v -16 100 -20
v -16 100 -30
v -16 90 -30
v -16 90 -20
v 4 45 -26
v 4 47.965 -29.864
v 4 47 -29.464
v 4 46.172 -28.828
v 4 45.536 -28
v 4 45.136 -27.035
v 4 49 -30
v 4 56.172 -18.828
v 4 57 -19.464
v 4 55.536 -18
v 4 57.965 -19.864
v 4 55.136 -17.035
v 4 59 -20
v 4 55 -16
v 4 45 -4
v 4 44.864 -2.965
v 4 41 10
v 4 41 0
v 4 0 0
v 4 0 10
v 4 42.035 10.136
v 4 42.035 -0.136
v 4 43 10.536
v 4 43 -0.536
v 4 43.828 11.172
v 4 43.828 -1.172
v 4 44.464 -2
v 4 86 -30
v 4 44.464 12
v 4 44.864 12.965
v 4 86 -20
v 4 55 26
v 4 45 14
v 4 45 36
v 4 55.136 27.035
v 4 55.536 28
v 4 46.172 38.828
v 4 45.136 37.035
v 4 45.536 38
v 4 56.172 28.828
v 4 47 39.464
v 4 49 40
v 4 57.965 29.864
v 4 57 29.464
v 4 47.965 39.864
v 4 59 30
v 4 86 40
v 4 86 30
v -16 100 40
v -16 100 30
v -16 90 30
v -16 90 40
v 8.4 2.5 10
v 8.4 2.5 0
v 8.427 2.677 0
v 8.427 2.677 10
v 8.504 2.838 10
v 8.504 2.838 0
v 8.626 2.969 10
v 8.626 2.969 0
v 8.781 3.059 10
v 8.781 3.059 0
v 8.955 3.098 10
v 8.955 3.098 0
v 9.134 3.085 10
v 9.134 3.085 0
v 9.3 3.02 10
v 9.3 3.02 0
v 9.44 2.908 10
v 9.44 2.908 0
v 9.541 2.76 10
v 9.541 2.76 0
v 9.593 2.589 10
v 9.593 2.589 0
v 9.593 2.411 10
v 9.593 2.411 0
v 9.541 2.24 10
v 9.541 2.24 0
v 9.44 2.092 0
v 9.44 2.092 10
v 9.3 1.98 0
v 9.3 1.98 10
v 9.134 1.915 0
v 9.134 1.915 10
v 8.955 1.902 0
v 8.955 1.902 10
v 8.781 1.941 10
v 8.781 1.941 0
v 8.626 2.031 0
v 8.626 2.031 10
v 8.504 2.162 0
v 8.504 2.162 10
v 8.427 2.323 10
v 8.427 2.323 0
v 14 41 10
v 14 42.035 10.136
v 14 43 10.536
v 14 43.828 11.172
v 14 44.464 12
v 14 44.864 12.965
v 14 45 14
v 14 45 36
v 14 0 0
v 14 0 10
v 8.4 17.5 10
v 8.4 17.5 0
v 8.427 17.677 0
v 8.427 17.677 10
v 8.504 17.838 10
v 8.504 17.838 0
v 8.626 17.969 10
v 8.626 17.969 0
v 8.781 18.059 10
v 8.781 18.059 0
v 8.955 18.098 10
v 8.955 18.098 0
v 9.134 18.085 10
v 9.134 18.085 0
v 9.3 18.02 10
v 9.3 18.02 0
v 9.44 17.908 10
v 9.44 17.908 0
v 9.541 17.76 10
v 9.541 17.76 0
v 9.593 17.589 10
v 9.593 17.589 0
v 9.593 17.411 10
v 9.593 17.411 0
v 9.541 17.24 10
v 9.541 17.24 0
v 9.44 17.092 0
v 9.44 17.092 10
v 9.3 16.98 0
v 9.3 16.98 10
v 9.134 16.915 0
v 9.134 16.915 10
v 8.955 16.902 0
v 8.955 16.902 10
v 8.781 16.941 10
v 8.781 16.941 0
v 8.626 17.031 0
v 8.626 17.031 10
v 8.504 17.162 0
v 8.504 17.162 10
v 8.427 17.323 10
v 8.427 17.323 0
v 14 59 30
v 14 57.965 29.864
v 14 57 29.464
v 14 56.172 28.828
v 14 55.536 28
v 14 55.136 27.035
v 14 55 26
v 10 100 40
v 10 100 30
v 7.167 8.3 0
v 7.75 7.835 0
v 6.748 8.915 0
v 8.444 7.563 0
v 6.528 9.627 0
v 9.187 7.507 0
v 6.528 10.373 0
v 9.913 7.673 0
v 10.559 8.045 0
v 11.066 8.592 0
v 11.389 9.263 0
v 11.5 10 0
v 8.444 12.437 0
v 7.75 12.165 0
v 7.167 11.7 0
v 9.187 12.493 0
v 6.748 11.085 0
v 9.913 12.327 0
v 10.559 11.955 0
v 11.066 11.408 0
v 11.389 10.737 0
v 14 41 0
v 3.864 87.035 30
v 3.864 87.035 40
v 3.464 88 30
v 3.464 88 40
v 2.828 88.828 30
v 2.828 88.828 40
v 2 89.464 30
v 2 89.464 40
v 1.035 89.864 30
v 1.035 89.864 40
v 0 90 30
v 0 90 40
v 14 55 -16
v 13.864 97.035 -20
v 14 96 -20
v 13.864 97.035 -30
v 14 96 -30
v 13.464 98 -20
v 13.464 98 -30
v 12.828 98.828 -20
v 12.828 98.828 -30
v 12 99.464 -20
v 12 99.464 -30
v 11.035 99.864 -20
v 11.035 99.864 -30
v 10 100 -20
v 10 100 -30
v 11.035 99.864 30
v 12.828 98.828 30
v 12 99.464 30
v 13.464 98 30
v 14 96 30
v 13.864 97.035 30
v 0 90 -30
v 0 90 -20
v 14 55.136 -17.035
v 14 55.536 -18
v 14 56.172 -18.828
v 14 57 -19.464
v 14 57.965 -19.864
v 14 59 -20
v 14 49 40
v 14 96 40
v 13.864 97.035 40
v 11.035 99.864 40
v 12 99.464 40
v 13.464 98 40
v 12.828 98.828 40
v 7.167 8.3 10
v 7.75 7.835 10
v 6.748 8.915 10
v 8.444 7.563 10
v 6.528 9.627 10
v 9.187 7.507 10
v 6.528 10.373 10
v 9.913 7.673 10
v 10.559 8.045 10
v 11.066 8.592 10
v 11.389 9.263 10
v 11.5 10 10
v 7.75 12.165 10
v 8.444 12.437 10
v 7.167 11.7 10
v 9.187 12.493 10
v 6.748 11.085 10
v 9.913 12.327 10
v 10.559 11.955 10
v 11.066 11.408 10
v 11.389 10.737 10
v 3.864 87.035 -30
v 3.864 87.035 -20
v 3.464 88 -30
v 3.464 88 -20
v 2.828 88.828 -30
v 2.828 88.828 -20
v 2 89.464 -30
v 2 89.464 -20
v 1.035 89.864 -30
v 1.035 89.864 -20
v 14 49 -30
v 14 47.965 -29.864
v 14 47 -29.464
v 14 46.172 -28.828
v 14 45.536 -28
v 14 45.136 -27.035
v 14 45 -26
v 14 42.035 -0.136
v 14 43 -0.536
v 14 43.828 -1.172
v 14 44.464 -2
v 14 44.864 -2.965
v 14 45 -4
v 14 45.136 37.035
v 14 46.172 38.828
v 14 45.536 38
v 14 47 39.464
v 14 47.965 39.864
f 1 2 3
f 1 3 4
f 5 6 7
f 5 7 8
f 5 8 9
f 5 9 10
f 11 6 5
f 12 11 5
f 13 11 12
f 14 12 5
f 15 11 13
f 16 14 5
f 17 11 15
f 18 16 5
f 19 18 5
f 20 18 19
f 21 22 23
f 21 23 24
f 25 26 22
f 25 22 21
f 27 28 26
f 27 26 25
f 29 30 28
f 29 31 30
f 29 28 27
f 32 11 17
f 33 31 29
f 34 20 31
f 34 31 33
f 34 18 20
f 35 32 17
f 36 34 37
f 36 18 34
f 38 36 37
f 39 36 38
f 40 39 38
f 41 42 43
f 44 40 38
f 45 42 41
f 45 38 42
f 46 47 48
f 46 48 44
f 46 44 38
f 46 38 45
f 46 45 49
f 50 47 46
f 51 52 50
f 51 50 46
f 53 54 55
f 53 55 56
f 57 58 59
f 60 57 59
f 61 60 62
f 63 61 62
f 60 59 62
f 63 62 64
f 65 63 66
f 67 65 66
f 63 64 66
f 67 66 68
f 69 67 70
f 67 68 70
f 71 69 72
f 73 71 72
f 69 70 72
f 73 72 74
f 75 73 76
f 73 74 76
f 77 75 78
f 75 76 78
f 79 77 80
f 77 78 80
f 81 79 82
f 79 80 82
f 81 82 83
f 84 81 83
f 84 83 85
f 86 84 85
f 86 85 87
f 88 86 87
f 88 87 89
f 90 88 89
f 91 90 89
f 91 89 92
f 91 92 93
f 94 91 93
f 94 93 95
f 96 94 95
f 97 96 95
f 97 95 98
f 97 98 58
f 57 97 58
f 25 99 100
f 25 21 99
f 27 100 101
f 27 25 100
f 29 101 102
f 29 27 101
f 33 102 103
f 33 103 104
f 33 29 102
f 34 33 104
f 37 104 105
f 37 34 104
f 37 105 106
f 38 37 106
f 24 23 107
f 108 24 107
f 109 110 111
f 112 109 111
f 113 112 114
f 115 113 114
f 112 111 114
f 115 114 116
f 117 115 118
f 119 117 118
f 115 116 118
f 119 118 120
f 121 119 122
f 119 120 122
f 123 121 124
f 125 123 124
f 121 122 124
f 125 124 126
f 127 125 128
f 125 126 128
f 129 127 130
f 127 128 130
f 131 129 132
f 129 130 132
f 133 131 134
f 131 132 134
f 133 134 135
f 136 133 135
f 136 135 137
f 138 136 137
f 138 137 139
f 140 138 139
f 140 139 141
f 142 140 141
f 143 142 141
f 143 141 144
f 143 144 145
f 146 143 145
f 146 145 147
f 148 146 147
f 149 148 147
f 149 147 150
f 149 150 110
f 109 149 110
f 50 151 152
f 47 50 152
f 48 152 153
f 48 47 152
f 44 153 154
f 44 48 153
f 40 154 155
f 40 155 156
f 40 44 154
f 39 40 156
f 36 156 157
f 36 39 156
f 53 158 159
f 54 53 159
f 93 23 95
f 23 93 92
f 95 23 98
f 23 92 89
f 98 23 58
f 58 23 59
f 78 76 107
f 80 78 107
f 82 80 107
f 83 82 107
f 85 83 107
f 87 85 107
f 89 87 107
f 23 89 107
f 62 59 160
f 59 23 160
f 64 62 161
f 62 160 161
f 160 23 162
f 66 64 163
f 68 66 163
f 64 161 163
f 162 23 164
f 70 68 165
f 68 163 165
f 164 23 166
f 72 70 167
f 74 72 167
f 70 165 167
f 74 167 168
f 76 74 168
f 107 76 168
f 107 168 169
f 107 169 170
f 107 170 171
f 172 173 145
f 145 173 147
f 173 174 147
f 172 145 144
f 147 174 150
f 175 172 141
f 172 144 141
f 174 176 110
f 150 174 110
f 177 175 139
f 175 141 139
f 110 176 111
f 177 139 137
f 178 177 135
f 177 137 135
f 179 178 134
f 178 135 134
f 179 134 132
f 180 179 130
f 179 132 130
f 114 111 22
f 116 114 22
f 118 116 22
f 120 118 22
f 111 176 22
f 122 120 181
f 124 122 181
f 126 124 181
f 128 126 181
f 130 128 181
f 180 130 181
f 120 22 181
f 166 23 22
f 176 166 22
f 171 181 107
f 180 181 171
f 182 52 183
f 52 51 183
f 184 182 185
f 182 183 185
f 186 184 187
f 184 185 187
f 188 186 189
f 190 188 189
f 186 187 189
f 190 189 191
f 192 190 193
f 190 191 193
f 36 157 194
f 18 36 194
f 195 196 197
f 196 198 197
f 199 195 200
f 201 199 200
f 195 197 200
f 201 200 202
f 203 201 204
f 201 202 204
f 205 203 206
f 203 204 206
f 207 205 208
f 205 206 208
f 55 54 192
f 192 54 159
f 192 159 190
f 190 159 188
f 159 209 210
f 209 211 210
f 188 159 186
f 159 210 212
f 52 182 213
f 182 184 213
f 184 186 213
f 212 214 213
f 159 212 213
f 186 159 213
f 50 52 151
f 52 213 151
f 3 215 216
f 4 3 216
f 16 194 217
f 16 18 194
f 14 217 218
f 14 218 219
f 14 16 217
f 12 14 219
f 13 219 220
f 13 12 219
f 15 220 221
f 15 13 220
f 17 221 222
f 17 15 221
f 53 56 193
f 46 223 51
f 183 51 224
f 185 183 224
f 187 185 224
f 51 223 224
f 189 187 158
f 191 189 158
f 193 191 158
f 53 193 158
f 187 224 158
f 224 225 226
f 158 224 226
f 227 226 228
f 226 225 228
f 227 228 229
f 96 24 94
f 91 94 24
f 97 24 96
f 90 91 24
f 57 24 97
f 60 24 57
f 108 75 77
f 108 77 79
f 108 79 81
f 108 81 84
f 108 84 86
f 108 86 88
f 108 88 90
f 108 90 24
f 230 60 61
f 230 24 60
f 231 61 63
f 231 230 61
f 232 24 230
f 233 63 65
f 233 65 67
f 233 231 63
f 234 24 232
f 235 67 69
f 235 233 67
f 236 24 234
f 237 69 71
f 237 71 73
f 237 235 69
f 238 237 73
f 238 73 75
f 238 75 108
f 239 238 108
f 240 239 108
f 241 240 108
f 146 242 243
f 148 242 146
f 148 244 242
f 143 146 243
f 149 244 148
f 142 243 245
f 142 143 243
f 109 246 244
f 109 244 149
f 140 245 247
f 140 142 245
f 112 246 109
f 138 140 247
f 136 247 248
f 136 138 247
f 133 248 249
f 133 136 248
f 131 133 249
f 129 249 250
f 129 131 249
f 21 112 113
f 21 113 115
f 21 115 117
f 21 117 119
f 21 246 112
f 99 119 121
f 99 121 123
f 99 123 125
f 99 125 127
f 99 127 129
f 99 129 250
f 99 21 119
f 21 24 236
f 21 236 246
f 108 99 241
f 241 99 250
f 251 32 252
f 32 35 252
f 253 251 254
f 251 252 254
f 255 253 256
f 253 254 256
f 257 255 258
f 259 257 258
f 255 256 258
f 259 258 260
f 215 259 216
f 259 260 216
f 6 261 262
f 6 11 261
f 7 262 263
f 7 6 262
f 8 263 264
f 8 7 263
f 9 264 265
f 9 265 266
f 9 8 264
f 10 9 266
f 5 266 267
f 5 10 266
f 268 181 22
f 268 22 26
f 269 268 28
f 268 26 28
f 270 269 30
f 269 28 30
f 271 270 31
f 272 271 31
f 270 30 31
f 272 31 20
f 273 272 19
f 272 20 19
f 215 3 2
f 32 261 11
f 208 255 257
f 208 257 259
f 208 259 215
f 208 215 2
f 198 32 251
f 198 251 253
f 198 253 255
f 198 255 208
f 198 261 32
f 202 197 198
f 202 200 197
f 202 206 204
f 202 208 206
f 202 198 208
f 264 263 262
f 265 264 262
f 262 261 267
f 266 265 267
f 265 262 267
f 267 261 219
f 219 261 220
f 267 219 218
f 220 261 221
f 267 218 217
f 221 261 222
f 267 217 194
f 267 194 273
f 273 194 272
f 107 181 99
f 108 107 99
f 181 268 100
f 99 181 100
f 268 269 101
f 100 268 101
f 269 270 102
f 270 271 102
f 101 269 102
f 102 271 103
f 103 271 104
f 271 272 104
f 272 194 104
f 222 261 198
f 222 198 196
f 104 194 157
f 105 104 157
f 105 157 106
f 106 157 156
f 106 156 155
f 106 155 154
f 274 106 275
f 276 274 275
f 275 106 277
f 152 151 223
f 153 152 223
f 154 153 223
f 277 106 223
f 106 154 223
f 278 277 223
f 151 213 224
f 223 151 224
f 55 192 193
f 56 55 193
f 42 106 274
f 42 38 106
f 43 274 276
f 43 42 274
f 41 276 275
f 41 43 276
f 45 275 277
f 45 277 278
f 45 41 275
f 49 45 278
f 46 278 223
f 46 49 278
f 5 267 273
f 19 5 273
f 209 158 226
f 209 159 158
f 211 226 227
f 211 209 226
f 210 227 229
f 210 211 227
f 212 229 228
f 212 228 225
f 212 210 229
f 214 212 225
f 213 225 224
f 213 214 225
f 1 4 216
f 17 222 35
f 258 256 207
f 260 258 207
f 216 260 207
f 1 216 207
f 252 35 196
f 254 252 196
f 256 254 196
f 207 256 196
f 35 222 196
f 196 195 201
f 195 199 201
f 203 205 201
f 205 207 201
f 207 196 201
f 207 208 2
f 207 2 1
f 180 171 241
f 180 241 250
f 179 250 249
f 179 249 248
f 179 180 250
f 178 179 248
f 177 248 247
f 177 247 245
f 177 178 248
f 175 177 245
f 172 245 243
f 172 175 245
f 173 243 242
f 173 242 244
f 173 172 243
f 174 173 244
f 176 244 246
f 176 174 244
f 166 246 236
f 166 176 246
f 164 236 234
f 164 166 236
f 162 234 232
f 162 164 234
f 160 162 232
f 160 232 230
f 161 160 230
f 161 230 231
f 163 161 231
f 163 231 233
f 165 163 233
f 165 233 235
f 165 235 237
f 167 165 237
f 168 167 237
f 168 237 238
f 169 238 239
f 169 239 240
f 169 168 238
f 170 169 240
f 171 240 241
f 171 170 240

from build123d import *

# Parameters (mm, degrees)
ESQUISSE1_W        = 10
ESQUISSE1_H        = 55
ESQUISSE1_R        = 2.5
ESQUISSE1_R_2      = 0.5
BOSS_EXTRU_1_DEPTH = 10
BOSS_EXTRU_2_DEPTH = 10
ESQUISSE5_W        = 10
ESQUISSE5_H        = 10
BOSS_EXTRU_3_DEPTH = 20
CONG_1_R           = 4
D_GAGEMENT_M11_D   = 1.2


with BuildPart() as part:
    # Esquisse1 → Boss.-Extru.1 (new body)
    with BuildSketch(Plane.XY):
        with Locations((9, 27.5)):
            Rectangle(ESQUISSE1_W, ESQUISSE1_H)
        with Locations((9, 10)):
            Circle(ESQUISSE1_R, mode=Mode.SUBTRACT)
        with Locations((9, 17.5)):
            Circle(ESQUISSE1_R_2, mode=Mode.SUBTRACT)
        with Locations((9, 2.5)):
            Circle(ESQUISSE1_R_2, mode=Mode.SUBTRACT)
    extrude(amount=BOSS_EXTRU_1_DEPTH)

    # Esquisse4 → Boss.-Extru.2 (add)
    with BuildSketch(Plane(origin=(14, 0, 0), x_dir=(0, 0, -1), z_dir=(1, 0, 0))):
        Polygon((-30, 55), (20, 55), (20, 100), (30, 100), (30, 45), (-40, 45), (-40, 100), (-30, 100), align=None)
    extrude(amount=-BOSS_EXTRU_2_DEPTH)

    # Esquisse5 → Boss.-Extru.3 (add)
    with BuildSketch(Plane.ZY.offset(-4)):
        with Locations((-25, 95)):
            Rectangle(ESQUISSE5_W, ESQUISSE5_H)
        with Locations((35, 95)):
            Rectangle(ESQUISSE5_W, ESQUISSE5_H)
    extrude(amount=BOSS_EXTRU_3_DEPTH)

    # Congé1
    cong_1_edges = [part.edges().sort_by_distance(p)[0] for p in [
        (9, 45, 0),
        (9, 45, -30),
        (14, 100, -25),
        (9, 55, -20),
        (9, 45, 10),
        (9, 45, 40),
        (9, 55, 30),
        (14, 100, 35),
        (4, 90, -25),
        (4, 90, 35),
    ]]
    fillet(cong_1_edges, radius=CONG_1_R)

    # Dégagement M11 (through all)
    with Locations(Plane.XY.offset(10)):
        with Locations((9, 17.5), (9, 2.5)):
            Hole(D_GAGEMENT_M11_D / 2)


solid = part.part
